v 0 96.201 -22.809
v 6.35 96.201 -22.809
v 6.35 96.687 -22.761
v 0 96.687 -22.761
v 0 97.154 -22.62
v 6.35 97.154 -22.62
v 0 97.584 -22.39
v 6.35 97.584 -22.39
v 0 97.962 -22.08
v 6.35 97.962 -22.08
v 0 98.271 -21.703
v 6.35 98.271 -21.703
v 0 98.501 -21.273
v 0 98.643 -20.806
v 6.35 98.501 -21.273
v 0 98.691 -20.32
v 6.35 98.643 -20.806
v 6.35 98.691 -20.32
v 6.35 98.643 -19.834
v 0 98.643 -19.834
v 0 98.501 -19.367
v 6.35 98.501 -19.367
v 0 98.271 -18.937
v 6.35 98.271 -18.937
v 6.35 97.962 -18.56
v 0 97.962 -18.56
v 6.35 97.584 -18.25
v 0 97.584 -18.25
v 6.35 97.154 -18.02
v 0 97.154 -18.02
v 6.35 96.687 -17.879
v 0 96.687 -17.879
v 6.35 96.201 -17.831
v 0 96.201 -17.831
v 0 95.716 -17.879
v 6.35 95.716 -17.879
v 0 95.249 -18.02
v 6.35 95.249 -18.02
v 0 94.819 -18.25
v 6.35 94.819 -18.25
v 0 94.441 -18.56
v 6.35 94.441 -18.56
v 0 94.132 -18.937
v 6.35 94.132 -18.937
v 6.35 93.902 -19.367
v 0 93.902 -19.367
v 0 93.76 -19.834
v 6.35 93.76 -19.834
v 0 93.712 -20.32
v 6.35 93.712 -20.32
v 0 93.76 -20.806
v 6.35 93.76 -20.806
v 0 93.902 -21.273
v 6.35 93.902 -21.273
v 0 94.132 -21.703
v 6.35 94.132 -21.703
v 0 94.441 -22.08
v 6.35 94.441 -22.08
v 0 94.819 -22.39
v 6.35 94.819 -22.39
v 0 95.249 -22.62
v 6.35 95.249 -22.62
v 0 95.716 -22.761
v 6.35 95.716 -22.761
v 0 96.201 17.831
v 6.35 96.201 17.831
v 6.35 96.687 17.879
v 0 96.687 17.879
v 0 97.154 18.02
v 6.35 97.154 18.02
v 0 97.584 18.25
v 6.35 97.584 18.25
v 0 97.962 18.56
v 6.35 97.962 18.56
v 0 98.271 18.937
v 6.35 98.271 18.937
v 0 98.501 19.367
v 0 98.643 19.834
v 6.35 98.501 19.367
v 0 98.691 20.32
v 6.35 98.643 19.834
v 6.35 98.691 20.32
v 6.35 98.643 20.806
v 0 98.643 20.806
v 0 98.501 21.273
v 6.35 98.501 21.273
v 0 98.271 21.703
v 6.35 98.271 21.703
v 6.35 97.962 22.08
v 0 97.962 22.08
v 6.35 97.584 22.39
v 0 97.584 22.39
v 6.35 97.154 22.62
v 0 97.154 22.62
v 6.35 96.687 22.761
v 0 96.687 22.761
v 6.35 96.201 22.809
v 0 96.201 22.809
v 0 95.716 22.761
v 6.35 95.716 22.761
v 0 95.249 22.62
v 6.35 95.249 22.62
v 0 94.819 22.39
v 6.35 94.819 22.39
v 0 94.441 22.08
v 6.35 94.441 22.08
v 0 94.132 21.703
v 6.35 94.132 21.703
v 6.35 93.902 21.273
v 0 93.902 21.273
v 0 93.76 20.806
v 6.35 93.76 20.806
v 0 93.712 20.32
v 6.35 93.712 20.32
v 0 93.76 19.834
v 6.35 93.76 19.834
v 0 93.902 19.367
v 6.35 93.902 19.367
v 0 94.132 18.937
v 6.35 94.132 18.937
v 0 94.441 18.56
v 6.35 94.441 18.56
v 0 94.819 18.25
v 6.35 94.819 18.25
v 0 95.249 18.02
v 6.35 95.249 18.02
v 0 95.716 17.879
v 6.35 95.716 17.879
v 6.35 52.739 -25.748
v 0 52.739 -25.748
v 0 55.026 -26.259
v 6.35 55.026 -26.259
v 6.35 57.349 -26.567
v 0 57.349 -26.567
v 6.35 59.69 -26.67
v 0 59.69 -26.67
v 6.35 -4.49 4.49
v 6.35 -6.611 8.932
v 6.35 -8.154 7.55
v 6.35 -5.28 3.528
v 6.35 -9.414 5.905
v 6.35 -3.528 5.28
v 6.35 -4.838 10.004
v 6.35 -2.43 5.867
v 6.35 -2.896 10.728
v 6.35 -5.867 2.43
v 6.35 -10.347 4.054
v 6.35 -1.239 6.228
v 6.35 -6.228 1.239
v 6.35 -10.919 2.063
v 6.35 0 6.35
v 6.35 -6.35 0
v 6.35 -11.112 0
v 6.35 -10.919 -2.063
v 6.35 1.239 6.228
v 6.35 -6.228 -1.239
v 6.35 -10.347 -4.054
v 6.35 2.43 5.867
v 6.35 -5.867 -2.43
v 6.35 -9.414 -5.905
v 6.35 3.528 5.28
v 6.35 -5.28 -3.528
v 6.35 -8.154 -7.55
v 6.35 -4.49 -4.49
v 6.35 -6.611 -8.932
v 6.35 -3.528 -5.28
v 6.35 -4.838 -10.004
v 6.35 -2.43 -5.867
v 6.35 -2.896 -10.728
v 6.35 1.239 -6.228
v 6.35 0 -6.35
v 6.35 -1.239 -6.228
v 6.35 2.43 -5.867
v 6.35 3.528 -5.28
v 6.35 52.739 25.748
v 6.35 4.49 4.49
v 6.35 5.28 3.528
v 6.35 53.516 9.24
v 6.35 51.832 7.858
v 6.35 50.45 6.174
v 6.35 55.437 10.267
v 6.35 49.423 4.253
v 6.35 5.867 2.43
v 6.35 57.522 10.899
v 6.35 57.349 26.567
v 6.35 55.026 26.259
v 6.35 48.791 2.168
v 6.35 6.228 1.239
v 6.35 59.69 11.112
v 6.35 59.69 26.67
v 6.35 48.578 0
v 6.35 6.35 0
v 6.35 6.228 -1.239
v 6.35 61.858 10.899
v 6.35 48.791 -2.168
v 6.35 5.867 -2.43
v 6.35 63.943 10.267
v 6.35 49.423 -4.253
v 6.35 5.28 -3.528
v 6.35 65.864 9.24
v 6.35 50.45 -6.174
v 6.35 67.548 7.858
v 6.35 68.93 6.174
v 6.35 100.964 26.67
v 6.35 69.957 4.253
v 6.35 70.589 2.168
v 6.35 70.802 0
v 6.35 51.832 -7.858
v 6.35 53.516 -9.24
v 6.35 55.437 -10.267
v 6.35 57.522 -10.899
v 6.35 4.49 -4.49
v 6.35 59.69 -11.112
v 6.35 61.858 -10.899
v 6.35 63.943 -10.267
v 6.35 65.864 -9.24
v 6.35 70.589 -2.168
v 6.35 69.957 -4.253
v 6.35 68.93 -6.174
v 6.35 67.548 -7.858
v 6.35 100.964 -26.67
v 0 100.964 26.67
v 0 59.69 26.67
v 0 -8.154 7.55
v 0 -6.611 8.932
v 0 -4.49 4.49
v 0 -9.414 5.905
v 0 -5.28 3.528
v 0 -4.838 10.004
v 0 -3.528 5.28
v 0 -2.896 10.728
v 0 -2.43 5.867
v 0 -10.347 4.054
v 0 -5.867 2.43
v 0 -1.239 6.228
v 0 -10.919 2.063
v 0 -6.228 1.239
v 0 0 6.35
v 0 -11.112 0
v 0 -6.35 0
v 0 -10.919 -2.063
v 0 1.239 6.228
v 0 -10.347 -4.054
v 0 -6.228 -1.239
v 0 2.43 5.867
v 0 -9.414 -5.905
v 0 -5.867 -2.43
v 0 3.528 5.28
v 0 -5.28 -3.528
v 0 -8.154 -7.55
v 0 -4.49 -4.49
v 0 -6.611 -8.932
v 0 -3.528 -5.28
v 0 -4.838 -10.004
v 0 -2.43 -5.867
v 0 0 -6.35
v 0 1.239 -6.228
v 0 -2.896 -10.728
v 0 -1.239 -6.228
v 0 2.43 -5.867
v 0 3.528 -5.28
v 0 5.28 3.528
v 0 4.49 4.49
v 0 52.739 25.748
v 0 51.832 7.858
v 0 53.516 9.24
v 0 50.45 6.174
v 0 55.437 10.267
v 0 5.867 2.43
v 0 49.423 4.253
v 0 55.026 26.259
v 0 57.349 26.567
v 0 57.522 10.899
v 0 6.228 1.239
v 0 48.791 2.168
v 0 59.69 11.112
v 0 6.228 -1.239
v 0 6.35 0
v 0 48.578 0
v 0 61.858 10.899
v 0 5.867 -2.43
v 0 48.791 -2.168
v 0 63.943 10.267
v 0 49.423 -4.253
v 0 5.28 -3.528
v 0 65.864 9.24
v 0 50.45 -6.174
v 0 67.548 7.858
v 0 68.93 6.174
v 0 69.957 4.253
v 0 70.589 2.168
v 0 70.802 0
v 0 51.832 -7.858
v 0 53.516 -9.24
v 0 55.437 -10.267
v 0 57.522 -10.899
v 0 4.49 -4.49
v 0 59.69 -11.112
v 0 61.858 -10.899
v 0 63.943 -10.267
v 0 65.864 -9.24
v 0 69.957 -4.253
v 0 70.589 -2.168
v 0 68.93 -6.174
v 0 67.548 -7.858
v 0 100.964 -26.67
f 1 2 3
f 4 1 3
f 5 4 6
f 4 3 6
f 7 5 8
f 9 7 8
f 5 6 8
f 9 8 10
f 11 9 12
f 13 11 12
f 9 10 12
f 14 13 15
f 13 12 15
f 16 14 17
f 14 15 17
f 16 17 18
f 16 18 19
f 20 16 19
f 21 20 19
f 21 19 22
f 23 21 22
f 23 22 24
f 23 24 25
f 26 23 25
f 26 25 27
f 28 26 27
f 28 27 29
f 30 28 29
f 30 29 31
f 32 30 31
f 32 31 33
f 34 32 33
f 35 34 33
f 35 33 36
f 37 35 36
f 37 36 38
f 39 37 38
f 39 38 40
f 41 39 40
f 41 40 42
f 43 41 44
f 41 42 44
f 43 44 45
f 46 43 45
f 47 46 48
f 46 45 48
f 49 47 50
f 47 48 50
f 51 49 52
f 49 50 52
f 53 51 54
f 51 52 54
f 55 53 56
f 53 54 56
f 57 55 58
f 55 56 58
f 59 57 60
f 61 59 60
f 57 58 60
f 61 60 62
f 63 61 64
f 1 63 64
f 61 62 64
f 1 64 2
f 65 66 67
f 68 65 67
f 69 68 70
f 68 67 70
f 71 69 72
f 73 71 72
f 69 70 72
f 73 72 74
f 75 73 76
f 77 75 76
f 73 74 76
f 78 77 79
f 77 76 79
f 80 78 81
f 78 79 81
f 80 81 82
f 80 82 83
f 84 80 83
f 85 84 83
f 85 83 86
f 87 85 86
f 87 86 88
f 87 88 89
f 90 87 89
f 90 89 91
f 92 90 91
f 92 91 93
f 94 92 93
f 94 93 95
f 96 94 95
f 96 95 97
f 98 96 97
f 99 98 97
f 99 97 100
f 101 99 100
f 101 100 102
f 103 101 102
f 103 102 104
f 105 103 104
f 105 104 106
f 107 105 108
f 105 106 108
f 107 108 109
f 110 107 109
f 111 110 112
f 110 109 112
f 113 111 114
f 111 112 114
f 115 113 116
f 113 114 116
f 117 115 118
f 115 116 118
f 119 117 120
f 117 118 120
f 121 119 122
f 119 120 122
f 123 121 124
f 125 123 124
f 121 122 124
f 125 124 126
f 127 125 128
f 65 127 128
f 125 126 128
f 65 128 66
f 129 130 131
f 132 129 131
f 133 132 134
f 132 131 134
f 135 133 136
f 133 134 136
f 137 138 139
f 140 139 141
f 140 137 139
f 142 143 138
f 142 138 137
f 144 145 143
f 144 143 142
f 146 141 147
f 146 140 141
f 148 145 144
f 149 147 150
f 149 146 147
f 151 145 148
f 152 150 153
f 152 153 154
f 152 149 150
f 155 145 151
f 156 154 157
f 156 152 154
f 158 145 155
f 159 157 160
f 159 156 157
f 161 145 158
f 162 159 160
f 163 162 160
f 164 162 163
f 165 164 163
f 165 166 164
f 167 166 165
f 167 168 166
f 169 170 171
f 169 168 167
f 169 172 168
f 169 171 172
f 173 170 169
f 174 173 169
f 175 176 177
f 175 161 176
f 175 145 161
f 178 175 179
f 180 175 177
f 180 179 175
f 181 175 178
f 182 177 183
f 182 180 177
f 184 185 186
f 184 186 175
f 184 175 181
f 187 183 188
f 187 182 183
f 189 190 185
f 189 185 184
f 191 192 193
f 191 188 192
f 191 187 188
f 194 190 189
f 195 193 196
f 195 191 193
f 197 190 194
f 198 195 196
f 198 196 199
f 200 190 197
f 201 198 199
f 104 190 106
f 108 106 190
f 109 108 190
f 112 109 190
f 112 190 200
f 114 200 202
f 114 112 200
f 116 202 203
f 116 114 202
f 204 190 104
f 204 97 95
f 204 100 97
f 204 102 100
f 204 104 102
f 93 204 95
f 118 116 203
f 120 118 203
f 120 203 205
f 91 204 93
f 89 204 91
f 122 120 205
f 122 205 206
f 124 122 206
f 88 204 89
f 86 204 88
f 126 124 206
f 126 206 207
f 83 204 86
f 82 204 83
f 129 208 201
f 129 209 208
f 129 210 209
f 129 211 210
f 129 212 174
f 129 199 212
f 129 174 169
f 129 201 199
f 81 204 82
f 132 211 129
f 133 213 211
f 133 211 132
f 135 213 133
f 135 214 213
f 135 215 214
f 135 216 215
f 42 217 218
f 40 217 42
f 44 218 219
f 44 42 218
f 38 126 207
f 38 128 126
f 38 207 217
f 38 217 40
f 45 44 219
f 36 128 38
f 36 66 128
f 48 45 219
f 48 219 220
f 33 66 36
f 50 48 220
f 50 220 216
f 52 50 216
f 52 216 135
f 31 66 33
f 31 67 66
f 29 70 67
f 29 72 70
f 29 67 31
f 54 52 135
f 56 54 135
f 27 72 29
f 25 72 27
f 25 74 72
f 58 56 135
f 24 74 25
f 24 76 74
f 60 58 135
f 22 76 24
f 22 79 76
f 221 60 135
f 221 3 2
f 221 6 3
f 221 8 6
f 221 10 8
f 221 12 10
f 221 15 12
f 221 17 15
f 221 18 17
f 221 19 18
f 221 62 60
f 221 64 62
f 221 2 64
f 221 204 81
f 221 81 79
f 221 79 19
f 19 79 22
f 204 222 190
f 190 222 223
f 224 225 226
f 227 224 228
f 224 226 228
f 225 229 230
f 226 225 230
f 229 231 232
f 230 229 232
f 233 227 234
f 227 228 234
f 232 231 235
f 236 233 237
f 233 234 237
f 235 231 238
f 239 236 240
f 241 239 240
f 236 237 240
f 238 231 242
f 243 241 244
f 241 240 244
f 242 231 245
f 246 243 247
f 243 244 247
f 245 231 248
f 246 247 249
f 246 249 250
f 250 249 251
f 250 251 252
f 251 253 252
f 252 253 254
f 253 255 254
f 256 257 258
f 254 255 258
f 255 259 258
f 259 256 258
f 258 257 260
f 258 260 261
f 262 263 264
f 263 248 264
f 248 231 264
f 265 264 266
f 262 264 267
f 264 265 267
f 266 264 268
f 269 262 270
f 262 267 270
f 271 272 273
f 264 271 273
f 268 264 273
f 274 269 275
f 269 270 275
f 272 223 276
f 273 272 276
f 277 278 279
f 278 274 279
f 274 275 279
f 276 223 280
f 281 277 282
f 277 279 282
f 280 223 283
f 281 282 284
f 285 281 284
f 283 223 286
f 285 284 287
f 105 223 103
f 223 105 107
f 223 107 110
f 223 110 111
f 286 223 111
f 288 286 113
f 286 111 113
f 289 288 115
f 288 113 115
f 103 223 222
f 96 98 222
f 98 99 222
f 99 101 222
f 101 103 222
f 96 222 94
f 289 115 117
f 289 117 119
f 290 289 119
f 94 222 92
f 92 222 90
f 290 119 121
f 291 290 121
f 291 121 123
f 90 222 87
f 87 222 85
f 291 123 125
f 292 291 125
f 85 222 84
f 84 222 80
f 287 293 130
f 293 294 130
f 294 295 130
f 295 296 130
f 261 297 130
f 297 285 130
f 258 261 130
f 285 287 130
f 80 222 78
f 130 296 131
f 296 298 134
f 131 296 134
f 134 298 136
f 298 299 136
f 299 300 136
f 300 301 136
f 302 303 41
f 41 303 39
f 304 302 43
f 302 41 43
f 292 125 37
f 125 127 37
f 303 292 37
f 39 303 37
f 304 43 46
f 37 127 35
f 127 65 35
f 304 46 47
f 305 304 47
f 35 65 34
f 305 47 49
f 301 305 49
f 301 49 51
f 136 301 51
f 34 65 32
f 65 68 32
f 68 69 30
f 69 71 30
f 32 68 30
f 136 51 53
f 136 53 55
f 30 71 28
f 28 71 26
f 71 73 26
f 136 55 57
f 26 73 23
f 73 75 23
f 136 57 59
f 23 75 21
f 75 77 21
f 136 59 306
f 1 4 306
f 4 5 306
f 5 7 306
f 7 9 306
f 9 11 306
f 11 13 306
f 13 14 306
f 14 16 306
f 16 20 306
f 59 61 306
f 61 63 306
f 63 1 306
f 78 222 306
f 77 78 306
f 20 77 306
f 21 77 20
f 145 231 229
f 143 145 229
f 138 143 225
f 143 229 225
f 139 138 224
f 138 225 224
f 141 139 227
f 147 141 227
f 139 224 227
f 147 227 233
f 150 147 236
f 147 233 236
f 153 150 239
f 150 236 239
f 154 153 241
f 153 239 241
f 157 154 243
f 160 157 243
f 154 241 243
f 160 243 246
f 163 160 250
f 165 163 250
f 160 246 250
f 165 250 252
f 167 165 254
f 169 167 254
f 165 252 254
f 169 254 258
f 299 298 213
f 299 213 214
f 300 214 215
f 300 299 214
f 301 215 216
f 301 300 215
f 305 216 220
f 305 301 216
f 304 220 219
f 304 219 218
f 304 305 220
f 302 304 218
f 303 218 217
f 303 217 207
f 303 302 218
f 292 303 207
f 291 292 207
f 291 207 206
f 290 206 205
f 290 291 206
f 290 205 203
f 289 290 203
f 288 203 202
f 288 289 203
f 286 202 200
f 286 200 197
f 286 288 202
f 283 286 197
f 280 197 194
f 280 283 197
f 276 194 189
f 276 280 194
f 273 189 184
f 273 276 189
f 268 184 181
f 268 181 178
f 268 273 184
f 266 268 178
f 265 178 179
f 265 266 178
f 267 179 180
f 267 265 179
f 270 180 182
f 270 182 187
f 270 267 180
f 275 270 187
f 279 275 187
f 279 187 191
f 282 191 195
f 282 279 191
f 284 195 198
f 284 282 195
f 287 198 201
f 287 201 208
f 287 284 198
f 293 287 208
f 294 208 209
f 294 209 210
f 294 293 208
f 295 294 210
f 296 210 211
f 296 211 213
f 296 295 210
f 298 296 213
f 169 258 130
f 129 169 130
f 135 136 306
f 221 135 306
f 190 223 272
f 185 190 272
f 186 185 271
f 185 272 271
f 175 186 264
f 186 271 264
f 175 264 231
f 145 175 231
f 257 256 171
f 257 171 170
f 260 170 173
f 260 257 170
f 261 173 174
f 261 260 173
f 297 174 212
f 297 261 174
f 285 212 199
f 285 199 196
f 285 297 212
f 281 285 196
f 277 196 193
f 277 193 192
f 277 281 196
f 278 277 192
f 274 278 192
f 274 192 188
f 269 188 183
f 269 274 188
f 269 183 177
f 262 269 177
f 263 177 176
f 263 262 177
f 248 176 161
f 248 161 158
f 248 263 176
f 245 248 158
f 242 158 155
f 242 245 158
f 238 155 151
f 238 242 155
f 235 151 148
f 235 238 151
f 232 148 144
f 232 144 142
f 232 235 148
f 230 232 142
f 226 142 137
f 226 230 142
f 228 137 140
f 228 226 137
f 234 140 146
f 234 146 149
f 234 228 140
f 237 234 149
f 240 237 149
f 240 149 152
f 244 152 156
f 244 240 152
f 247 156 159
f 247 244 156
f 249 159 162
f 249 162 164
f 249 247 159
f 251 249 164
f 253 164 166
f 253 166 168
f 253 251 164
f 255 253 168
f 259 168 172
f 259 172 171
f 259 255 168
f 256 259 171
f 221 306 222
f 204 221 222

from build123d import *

# Parameters (mm, degrees)
SKETCH1_R              = 6.35
SKETCH1_R_2            = 11.1125
BOSS_EXTRUDE1_DEPTH    = 6.35
F_10_CLEARANCE_HOLE1_D = 4.9784


with BuildPart() as part:
    # Sketch1 → Boss-Extrude1 (new body)
    with BuildSketch(Plane(origin=(0, 0, 0), x_dir=(0, 0, -1), z_dir=(1, 0, 0))):
        with BuildLine():
            Line((-25.748192037, 52.738776596), (-10.728413349, -2.896343085))
            ThreePointArc((-10.728413349, -2.896343085), (0, -11.1125), (10.728413349, -2.896343085))
            Line((10.728413349, -2.896343085), (25.748192037, 52.738776596))
            ThreePointArc((25.748192037, 52.738776596), (26.438543659, 56.183961041), (26.67, 59.69))
            Line((26.67, 59.69), (26.67, 100.96397257))
            Line((26.67, 100.96397257), (-26.67, 100.96397257))
            Line((-26.67, 100.96397257), (-26.67, 59.69))
            ThreePointArc((-26.67, 59.69), (-26.438543659, 56.183961041), (-25.748192037, 52.738776596))
        make_face()
        Circle(SKETCH1_R, mode=Mode.SUBTRACT)
        with Locations((0, 59.69)):
            Circle(SKETCH1_R_2, mode=Mode.SUBTRACT)
    extrude(amount=BOSS_EXTRUDE1_DEPTH)

    # #10 Clearance Hole1 (through all)
    with Locations(Plane.ZY):
        with Locations((20.32, 96.20147257), (-20.32, 96.20147257)):
            Hole(F_10_CLEARANCE_HOLE1_D / 2)


solid = part.part
